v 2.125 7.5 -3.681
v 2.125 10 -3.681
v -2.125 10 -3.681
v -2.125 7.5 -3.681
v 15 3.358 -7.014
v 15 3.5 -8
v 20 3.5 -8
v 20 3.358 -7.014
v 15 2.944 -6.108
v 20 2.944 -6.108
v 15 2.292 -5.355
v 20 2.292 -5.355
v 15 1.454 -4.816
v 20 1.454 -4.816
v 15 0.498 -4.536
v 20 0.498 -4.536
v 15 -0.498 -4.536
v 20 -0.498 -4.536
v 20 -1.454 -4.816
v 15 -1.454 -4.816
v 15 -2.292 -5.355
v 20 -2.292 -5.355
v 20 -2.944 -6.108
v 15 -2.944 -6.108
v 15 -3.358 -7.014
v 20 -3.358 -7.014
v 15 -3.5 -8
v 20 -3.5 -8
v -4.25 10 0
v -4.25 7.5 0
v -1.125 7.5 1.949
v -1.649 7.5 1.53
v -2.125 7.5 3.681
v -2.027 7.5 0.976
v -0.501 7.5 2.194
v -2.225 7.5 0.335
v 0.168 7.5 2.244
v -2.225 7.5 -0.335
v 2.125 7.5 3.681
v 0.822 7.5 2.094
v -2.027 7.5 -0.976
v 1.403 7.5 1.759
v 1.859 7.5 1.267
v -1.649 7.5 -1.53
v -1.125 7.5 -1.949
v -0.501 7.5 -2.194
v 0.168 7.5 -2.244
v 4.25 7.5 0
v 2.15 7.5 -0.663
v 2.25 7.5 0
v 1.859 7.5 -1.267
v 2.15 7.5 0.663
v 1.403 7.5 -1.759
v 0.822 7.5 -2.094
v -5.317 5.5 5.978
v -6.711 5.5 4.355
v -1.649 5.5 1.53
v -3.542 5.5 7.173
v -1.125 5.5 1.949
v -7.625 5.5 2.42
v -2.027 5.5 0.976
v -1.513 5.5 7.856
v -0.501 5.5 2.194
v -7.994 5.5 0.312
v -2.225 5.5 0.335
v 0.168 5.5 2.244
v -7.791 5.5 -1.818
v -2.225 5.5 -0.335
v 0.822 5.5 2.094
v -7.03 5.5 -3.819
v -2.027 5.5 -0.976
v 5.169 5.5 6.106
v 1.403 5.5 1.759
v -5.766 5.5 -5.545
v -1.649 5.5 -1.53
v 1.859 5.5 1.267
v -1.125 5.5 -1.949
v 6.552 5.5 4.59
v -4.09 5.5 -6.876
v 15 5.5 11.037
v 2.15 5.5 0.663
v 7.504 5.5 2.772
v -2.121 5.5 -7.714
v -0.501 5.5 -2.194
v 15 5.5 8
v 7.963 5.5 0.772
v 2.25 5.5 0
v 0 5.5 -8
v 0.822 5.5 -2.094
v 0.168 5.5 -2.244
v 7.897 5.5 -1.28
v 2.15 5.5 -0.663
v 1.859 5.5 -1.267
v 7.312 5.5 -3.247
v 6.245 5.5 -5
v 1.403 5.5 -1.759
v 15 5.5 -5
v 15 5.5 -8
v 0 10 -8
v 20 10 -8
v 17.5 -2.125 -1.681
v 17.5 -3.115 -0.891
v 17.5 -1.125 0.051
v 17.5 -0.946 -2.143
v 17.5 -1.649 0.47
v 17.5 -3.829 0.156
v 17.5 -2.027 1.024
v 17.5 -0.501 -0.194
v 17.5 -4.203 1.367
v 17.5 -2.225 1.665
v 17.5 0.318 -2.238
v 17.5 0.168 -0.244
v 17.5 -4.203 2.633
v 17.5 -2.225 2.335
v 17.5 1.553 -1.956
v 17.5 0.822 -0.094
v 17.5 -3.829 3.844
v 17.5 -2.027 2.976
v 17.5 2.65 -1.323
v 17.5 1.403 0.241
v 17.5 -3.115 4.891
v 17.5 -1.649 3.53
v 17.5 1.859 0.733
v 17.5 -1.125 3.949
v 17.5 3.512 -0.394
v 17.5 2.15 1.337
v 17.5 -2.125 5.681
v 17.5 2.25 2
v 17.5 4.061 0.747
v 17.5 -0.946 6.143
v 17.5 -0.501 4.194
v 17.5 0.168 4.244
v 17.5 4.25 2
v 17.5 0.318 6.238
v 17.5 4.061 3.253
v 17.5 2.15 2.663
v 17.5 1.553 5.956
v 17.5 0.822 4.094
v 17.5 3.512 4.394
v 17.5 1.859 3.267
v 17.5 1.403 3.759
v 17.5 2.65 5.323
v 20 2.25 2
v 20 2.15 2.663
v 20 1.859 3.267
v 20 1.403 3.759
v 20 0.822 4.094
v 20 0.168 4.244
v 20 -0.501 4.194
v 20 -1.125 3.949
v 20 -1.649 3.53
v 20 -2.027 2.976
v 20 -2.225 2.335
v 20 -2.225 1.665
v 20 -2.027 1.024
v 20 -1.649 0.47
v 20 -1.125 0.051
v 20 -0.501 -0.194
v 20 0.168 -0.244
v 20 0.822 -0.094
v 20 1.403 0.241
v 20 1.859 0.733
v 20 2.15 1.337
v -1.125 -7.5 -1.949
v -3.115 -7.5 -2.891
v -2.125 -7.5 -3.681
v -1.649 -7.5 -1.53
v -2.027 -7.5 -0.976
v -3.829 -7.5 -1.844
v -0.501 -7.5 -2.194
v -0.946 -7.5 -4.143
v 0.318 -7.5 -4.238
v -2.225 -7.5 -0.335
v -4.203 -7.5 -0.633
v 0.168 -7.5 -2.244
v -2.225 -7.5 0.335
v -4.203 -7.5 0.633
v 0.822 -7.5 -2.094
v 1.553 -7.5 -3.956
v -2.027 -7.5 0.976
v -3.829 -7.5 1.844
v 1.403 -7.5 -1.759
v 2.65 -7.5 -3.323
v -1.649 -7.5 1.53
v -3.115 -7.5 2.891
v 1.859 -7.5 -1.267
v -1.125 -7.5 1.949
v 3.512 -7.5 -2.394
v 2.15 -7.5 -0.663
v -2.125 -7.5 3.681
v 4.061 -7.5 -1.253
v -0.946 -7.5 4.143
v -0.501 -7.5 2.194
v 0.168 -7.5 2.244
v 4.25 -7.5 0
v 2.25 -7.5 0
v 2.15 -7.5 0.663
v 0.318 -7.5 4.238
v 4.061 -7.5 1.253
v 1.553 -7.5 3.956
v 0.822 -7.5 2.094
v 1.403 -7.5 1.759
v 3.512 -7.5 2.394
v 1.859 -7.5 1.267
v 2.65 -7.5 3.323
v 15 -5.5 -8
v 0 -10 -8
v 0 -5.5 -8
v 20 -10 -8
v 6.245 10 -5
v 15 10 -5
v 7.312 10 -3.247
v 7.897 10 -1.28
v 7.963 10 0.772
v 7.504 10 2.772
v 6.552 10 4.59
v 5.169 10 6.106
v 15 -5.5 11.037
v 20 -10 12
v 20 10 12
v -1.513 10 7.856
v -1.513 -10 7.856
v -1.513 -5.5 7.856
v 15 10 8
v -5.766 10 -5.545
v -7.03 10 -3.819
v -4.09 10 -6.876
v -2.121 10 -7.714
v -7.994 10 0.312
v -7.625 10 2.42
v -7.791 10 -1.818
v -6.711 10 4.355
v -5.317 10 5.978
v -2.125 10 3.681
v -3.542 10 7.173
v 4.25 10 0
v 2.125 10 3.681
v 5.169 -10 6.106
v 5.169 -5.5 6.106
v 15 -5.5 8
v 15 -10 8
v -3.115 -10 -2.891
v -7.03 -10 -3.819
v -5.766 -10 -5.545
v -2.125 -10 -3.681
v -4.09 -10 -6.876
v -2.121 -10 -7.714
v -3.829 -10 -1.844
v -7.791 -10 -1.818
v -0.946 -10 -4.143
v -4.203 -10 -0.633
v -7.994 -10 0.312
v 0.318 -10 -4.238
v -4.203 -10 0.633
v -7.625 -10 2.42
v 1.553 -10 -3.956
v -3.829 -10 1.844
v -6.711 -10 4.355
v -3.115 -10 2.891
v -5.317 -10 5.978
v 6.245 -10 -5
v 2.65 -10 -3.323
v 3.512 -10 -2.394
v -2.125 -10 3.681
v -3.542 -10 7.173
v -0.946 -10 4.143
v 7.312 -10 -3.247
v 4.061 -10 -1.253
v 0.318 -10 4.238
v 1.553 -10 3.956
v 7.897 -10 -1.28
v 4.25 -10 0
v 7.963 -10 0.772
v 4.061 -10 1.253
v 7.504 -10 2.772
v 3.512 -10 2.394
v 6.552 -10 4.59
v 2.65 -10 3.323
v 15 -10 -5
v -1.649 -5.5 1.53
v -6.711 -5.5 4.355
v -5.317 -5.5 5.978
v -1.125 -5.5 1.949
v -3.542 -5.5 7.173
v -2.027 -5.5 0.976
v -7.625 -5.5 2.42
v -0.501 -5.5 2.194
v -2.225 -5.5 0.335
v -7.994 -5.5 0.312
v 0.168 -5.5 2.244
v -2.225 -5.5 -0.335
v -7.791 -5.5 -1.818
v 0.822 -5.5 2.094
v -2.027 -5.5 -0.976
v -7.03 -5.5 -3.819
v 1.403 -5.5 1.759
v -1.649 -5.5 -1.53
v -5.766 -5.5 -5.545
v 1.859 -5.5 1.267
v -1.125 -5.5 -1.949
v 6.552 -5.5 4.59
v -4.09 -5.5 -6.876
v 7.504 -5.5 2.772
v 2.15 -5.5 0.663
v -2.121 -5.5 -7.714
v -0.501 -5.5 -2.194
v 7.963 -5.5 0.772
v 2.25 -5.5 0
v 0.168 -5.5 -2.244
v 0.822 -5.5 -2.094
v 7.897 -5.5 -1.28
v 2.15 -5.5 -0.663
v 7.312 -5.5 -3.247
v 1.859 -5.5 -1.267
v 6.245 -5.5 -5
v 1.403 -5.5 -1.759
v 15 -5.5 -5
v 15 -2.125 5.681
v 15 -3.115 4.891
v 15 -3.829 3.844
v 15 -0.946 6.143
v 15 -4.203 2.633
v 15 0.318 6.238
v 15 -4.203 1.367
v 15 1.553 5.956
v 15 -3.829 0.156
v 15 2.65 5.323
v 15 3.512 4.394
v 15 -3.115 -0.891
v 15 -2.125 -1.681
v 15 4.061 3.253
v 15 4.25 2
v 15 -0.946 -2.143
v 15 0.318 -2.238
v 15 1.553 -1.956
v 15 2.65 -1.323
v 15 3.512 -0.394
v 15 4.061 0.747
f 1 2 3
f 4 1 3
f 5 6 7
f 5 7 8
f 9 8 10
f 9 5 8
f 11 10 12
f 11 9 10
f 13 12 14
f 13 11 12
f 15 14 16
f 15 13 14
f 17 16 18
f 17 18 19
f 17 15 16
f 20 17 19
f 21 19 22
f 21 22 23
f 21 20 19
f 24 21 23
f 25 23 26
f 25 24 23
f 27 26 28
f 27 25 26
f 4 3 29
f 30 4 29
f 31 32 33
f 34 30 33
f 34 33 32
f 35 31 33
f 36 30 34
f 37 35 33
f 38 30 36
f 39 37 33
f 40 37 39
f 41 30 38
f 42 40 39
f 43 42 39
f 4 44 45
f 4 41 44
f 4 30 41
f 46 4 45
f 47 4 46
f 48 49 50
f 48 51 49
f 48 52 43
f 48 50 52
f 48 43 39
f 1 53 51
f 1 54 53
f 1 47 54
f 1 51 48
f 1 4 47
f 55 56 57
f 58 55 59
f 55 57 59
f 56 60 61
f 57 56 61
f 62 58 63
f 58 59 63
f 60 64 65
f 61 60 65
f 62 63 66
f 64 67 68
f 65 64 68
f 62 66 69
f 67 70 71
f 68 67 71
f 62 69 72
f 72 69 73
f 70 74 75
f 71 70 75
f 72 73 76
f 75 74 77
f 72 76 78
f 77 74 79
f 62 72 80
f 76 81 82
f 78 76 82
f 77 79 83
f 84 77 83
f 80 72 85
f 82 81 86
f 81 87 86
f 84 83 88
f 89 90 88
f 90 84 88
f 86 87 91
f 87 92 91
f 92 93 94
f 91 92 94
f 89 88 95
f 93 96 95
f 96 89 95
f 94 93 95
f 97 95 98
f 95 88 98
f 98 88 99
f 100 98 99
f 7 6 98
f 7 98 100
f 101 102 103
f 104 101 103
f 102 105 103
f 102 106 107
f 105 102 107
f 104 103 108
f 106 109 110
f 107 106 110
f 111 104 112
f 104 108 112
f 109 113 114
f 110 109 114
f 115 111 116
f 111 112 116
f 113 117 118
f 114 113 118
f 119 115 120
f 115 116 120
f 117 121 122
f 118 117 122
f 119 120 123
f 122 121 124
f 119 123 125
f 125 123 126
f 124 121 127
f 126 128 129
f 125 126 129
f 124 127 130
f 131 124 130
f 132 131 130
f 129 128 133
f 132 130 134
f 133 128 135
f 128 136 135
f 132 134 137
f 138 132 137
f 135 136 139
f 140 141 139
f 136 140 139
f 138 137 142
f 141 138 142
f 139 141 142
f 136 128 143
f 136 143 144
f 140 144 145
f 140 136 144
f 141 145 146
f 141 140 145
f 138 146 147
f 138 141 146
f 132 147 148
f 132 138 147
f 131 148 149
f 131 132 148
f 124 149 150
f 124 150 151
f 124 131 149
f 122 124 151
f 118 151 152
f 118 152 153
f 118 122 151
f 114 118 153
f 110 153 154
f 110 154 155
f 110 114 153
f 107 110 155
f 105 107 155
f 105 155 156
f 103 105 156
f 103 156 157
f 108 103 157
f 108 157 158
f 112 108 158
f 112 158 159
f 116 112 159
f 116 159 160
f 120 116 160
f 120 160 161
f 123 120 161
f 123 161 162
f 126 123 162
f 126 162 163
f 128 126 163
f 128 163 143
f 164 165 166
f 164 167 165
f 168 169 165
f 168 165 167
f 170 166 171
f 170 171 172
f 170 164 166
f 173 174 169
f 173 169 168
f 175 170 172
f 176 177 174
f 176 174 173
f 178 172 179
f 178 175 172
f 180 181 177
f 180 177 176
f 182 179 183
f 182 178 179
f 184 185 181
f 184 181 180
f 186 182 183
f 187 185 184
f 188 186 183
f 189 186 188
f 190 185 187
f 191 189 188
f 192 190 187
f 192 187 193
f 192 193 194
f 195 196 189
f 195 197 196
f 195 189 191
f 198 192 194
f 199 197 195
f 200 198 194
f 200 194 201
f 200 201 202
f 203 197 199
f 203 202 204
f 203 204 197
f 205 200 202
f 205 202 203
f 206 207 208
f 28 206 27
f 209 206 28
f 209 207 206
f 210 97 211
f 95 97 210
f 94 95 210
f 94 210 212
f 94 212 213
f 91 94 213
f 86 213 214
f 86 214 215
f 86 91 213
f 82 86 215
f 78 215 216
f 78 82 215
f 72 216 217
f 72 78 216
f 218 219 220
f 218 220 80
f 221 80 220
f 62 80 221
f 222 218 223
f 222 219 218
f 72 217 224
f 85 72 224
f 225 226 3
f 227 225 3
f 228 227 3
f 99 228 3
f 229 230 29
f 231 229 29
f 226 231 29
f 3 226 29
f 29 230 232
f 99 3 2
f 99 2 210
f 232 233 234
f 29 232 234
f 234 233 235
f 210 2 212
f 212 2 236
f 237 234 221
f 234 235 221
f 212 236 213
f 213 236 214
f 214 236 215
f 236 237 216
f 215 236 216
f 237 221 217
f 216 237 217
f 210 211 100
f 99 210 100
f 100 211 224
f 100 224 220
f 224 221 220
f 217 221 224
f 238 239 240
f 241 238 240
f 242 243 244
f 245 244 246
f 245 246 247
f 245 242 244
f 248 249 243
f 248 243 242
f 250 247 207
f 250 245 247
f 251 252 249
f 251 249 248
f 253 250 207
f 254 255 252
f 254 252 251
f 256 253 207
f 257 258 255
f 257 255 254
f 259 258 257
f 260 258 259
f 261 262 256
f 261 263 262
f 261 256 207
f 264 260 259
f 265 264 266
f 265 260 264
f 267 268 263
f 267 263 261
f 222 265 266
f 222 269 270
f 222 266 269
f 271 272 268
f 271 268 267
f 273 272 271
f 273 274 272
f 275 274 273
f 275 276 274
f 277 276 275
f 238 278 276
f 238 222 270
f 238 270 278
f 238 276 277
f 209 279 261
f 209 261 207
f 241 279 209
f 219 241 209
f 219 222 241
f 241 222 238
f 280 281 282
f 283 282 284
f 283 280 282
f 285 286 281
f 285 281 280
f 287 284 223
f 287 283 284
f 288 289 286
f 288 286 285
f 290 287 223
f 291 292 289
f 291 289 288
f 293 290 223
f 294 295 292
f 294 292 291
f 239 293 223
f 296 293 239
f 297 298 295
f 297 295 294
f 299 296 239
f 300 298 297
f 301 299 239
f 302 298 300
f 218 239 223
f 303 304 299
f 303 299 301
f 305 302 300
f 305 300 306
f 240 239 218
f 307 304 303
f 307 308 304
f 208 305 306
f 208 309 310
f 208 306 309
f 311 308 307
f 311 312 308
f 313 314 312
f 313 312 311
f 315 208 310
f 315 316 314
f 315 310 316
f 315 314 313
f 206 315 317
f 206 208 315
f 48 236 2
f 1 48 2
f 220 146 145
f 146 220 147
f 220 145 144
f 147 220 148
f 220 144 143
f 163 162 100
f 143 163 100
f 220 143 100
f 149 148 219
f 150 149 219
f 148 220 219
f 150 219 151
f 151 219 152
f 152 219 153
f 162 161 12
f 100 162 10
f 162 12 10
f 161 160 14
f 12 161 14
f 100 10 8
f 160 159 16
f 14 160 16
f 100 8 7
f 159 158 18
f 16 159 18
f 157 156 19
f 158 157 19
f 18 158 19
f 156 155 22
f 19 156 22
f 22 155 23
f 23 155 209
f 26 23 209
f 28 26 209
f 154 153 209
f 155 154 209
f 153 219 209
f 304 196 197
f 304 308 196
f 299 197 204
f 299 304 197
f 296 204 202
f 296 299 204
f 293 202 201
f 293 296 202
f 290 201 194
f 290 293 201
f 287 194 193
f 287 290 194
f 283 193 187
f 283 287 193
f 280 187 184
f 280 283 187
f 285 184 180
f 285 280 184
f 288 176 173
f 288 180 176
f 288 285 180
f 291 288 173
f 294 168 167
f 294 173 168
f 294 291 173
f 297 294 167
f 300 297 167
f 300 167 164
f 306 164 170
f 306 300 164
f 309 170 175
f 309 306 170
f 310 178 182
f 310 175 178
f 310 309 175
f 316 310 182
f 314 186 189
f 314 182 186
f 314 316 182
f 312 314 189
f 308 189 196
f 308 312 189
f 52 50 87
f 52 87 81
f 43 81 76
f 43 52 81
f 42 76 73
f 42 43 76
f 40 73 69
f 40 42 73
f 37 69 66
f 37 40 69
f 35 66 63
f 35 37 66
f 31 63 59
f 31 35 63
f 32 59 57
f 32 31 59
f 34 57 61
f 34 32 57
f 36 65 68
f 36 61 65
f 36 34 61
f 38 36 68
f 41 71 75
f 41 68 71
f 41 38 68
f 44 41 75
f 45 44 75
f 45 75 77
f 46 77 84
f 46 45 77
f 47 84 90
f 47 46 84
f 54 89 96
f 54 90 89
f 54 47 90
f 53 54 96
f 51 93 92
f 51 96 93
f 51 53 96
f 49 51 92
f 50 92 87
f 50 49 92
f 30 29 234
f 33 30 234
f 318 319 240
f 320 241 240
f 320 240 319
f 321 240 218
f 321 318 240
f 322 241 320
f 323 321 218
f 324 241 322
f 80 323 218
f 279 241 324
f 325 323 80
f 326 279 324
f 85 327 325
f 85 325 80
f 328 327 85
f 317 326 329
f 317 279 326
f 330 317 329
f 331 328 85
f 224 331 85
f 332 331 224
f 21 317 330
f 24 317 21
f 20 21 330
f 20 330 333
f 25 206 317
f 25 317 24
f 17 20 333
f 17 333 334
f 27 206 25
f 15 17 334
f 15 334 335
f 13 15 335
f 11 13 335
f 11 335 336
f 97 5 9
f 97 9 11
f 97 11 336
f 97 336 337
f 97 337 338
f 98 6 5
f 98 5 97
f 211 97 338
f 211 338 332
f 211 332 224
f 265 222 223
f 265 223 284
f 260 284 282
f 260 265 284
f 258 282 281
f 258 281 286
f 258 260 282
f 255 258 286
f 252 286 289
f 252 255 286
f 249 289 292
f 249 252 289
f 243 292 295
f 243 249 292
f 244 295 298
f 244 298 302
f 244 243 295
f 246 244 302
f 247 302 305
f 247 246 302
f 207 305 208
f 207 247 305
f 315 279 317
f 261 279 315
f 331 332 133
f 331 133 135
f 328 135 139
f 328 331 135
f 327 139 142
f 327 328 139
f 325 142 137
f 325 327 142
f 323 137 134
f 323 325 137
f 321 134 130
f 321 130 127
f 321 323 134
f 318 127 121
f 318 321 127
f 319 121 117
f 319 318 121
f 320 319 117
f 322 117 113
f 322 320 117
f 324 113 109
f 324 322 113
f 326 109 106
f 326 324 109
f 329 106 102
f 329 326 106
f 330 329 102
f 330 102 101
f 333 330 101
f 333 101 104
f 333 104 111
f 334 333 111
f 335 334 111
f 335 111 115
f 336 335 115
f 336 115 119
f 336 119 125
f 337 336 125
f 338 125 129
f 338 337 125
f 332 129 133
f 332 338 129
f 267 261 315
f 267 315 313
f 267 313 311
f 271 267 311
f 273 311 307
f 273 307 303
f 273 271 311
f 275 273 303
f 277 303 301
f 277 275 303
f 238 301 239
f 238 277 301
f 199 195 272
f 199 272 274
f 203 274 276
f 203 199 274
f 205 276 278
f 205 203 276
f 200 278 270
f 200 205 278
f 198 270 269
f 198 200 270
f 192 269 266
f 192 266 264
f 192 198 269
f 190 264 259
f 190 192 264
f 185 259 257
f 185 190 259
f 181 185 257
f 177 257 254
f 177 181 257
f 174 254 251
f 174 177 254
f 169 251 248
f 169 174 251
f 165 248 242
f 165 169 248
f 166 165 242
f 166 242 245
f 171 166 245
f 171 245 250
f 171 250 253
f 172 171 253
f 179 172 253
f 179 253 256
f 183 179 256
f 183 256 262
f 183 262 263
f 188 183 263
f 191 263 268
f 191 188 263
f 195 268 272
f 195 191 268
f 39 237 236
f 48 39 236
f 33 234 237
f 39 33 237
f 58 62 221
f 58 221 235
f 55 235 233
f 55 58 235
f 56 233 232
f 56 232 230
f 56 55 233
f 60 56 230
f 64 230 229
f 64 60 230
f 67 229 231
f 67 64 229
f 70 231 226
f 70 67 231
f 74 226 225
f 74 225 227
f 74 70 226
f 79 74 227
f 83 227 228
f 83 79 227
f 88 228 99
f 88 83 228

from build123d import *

# Parameters (mm, degrees)
SKETCH024_R       = 2.25
PAD018_DEPTH      = 10
CYLINDER062_R     = 3.5
CYLINDER062_DEPTH = 5
BOX001_W          = 26
BOX001_H          = 11
BOX001_DEPTH      = 20
CYLINDER065_R     = 2.25
CYLINDER065_DEPTH = 5
CYLINDER066_R     = 4.25
CYLINDER066_DEPTH = 2.5
CYLINDER067_R     = 4.25
CYLINDER067_DEPTH = 2.5
POCKET008_DEPTH   = 2.5


with BuildPart() as part:
    # Sketch024 → Pad018 (new body, symmetric)
    with BuildSketch(Plane.XZ):
        with BuildLine():
            ThreePointArc((-1.513336, 7.85556), (-7.963808, -0.760107), (0, -8))
            Line((0, -8), (20, -8))
            Line((20, 12), (20, -8))
            Line((20, 12), (-1.513336, 7.85556))
        make_face()
        Circle(SKETCH024_R, mode=Mode.SUBTRACT)
        with BuildLine():
            Line((5.168757, 6.106058), (15, 8))
            Line((15, 8), (15, -5))
            Line((15, -5), (6.244998, -5))
            ThreePointArc((6.244998, -5), (7.9627, 0.771631), (5.168757, 6.106058))
        make_face(mode=Mode.SUBTRACT)
    extrude(amount=PAD018_DEPTH, both=True)

    # Cylinder062 → Cylinder062 (cut)
    with BuildSketch(Plane(origin=(15, 0, -8), x_dir=(0, 1, 0), z_dir=(1, 0, 0))):
        Circle(CYLINDER062_R)
    extrude(amount=CYLINDER062_DEPTH, mode=Mode.SUBTRACT)

    # Box001 → Box001 (cut)
    with BuildSketch(Plane(origin=(-11, -5.5, -8), x_dir=(1, 0, 0), z_dir=(0, 0, 1))):
        with Locations((13, 5.5)):
            Rectangle(BOX001_W, BOX001_H)
    extrude(amount=BOX001_DEPTH, mode=Mode.SUBTRACT)

    # Cylinder065 → Cylinder065 (cut)
    with BuildSketch(Plane(origin=(15, 0, 2), x_dir=(0, 1, 0), z_dir=(1, 0, 0))):
        Circle(CYLINDER065_R)
    extrude(amount=CYLINDER065_DEPTH, mode=Mode.SUBTRACT)

    # Cylinder066 → Cylinder066 (cut)
    with BuildSketch(Plane(origin=(15, 0, 2), x_dir=(0, 1, 0), z_dir=(1, 0, 0))):
        Circle(CYLINDER066_R)
    extrude(amount=CYLINDER066_DEPTH, mode=Mode.SUBTRACT)

    # Cylinder067 → Cylinder067 (cut)
    with BuildSketch(Plane.XZ.offset(7.5)):
        Circle(CYLINDER067_R)
    extrude(amount=CYLINDER067_DEPTH, mode=Mode.SUBTRACT)

    # Sketch040 (on Face2 of Cylinder067) → Pocket008 (cut)
    with BuildSketch(Plane(origin=(0, 10, 0), x_dir=(1, 0, 0), z_dir=(0, 1, 0))):
        Polygon((4.25, 0), (2.125, 3.680608), (-2.125, 3.680608), (-4.25, 0), (-2.125, -3.680608), (2.125, -3.680608), align=None)
    extrude(amount=-POCKET008_DEPTH, mode=Mode.SUBTRACT)


solid = part.part
